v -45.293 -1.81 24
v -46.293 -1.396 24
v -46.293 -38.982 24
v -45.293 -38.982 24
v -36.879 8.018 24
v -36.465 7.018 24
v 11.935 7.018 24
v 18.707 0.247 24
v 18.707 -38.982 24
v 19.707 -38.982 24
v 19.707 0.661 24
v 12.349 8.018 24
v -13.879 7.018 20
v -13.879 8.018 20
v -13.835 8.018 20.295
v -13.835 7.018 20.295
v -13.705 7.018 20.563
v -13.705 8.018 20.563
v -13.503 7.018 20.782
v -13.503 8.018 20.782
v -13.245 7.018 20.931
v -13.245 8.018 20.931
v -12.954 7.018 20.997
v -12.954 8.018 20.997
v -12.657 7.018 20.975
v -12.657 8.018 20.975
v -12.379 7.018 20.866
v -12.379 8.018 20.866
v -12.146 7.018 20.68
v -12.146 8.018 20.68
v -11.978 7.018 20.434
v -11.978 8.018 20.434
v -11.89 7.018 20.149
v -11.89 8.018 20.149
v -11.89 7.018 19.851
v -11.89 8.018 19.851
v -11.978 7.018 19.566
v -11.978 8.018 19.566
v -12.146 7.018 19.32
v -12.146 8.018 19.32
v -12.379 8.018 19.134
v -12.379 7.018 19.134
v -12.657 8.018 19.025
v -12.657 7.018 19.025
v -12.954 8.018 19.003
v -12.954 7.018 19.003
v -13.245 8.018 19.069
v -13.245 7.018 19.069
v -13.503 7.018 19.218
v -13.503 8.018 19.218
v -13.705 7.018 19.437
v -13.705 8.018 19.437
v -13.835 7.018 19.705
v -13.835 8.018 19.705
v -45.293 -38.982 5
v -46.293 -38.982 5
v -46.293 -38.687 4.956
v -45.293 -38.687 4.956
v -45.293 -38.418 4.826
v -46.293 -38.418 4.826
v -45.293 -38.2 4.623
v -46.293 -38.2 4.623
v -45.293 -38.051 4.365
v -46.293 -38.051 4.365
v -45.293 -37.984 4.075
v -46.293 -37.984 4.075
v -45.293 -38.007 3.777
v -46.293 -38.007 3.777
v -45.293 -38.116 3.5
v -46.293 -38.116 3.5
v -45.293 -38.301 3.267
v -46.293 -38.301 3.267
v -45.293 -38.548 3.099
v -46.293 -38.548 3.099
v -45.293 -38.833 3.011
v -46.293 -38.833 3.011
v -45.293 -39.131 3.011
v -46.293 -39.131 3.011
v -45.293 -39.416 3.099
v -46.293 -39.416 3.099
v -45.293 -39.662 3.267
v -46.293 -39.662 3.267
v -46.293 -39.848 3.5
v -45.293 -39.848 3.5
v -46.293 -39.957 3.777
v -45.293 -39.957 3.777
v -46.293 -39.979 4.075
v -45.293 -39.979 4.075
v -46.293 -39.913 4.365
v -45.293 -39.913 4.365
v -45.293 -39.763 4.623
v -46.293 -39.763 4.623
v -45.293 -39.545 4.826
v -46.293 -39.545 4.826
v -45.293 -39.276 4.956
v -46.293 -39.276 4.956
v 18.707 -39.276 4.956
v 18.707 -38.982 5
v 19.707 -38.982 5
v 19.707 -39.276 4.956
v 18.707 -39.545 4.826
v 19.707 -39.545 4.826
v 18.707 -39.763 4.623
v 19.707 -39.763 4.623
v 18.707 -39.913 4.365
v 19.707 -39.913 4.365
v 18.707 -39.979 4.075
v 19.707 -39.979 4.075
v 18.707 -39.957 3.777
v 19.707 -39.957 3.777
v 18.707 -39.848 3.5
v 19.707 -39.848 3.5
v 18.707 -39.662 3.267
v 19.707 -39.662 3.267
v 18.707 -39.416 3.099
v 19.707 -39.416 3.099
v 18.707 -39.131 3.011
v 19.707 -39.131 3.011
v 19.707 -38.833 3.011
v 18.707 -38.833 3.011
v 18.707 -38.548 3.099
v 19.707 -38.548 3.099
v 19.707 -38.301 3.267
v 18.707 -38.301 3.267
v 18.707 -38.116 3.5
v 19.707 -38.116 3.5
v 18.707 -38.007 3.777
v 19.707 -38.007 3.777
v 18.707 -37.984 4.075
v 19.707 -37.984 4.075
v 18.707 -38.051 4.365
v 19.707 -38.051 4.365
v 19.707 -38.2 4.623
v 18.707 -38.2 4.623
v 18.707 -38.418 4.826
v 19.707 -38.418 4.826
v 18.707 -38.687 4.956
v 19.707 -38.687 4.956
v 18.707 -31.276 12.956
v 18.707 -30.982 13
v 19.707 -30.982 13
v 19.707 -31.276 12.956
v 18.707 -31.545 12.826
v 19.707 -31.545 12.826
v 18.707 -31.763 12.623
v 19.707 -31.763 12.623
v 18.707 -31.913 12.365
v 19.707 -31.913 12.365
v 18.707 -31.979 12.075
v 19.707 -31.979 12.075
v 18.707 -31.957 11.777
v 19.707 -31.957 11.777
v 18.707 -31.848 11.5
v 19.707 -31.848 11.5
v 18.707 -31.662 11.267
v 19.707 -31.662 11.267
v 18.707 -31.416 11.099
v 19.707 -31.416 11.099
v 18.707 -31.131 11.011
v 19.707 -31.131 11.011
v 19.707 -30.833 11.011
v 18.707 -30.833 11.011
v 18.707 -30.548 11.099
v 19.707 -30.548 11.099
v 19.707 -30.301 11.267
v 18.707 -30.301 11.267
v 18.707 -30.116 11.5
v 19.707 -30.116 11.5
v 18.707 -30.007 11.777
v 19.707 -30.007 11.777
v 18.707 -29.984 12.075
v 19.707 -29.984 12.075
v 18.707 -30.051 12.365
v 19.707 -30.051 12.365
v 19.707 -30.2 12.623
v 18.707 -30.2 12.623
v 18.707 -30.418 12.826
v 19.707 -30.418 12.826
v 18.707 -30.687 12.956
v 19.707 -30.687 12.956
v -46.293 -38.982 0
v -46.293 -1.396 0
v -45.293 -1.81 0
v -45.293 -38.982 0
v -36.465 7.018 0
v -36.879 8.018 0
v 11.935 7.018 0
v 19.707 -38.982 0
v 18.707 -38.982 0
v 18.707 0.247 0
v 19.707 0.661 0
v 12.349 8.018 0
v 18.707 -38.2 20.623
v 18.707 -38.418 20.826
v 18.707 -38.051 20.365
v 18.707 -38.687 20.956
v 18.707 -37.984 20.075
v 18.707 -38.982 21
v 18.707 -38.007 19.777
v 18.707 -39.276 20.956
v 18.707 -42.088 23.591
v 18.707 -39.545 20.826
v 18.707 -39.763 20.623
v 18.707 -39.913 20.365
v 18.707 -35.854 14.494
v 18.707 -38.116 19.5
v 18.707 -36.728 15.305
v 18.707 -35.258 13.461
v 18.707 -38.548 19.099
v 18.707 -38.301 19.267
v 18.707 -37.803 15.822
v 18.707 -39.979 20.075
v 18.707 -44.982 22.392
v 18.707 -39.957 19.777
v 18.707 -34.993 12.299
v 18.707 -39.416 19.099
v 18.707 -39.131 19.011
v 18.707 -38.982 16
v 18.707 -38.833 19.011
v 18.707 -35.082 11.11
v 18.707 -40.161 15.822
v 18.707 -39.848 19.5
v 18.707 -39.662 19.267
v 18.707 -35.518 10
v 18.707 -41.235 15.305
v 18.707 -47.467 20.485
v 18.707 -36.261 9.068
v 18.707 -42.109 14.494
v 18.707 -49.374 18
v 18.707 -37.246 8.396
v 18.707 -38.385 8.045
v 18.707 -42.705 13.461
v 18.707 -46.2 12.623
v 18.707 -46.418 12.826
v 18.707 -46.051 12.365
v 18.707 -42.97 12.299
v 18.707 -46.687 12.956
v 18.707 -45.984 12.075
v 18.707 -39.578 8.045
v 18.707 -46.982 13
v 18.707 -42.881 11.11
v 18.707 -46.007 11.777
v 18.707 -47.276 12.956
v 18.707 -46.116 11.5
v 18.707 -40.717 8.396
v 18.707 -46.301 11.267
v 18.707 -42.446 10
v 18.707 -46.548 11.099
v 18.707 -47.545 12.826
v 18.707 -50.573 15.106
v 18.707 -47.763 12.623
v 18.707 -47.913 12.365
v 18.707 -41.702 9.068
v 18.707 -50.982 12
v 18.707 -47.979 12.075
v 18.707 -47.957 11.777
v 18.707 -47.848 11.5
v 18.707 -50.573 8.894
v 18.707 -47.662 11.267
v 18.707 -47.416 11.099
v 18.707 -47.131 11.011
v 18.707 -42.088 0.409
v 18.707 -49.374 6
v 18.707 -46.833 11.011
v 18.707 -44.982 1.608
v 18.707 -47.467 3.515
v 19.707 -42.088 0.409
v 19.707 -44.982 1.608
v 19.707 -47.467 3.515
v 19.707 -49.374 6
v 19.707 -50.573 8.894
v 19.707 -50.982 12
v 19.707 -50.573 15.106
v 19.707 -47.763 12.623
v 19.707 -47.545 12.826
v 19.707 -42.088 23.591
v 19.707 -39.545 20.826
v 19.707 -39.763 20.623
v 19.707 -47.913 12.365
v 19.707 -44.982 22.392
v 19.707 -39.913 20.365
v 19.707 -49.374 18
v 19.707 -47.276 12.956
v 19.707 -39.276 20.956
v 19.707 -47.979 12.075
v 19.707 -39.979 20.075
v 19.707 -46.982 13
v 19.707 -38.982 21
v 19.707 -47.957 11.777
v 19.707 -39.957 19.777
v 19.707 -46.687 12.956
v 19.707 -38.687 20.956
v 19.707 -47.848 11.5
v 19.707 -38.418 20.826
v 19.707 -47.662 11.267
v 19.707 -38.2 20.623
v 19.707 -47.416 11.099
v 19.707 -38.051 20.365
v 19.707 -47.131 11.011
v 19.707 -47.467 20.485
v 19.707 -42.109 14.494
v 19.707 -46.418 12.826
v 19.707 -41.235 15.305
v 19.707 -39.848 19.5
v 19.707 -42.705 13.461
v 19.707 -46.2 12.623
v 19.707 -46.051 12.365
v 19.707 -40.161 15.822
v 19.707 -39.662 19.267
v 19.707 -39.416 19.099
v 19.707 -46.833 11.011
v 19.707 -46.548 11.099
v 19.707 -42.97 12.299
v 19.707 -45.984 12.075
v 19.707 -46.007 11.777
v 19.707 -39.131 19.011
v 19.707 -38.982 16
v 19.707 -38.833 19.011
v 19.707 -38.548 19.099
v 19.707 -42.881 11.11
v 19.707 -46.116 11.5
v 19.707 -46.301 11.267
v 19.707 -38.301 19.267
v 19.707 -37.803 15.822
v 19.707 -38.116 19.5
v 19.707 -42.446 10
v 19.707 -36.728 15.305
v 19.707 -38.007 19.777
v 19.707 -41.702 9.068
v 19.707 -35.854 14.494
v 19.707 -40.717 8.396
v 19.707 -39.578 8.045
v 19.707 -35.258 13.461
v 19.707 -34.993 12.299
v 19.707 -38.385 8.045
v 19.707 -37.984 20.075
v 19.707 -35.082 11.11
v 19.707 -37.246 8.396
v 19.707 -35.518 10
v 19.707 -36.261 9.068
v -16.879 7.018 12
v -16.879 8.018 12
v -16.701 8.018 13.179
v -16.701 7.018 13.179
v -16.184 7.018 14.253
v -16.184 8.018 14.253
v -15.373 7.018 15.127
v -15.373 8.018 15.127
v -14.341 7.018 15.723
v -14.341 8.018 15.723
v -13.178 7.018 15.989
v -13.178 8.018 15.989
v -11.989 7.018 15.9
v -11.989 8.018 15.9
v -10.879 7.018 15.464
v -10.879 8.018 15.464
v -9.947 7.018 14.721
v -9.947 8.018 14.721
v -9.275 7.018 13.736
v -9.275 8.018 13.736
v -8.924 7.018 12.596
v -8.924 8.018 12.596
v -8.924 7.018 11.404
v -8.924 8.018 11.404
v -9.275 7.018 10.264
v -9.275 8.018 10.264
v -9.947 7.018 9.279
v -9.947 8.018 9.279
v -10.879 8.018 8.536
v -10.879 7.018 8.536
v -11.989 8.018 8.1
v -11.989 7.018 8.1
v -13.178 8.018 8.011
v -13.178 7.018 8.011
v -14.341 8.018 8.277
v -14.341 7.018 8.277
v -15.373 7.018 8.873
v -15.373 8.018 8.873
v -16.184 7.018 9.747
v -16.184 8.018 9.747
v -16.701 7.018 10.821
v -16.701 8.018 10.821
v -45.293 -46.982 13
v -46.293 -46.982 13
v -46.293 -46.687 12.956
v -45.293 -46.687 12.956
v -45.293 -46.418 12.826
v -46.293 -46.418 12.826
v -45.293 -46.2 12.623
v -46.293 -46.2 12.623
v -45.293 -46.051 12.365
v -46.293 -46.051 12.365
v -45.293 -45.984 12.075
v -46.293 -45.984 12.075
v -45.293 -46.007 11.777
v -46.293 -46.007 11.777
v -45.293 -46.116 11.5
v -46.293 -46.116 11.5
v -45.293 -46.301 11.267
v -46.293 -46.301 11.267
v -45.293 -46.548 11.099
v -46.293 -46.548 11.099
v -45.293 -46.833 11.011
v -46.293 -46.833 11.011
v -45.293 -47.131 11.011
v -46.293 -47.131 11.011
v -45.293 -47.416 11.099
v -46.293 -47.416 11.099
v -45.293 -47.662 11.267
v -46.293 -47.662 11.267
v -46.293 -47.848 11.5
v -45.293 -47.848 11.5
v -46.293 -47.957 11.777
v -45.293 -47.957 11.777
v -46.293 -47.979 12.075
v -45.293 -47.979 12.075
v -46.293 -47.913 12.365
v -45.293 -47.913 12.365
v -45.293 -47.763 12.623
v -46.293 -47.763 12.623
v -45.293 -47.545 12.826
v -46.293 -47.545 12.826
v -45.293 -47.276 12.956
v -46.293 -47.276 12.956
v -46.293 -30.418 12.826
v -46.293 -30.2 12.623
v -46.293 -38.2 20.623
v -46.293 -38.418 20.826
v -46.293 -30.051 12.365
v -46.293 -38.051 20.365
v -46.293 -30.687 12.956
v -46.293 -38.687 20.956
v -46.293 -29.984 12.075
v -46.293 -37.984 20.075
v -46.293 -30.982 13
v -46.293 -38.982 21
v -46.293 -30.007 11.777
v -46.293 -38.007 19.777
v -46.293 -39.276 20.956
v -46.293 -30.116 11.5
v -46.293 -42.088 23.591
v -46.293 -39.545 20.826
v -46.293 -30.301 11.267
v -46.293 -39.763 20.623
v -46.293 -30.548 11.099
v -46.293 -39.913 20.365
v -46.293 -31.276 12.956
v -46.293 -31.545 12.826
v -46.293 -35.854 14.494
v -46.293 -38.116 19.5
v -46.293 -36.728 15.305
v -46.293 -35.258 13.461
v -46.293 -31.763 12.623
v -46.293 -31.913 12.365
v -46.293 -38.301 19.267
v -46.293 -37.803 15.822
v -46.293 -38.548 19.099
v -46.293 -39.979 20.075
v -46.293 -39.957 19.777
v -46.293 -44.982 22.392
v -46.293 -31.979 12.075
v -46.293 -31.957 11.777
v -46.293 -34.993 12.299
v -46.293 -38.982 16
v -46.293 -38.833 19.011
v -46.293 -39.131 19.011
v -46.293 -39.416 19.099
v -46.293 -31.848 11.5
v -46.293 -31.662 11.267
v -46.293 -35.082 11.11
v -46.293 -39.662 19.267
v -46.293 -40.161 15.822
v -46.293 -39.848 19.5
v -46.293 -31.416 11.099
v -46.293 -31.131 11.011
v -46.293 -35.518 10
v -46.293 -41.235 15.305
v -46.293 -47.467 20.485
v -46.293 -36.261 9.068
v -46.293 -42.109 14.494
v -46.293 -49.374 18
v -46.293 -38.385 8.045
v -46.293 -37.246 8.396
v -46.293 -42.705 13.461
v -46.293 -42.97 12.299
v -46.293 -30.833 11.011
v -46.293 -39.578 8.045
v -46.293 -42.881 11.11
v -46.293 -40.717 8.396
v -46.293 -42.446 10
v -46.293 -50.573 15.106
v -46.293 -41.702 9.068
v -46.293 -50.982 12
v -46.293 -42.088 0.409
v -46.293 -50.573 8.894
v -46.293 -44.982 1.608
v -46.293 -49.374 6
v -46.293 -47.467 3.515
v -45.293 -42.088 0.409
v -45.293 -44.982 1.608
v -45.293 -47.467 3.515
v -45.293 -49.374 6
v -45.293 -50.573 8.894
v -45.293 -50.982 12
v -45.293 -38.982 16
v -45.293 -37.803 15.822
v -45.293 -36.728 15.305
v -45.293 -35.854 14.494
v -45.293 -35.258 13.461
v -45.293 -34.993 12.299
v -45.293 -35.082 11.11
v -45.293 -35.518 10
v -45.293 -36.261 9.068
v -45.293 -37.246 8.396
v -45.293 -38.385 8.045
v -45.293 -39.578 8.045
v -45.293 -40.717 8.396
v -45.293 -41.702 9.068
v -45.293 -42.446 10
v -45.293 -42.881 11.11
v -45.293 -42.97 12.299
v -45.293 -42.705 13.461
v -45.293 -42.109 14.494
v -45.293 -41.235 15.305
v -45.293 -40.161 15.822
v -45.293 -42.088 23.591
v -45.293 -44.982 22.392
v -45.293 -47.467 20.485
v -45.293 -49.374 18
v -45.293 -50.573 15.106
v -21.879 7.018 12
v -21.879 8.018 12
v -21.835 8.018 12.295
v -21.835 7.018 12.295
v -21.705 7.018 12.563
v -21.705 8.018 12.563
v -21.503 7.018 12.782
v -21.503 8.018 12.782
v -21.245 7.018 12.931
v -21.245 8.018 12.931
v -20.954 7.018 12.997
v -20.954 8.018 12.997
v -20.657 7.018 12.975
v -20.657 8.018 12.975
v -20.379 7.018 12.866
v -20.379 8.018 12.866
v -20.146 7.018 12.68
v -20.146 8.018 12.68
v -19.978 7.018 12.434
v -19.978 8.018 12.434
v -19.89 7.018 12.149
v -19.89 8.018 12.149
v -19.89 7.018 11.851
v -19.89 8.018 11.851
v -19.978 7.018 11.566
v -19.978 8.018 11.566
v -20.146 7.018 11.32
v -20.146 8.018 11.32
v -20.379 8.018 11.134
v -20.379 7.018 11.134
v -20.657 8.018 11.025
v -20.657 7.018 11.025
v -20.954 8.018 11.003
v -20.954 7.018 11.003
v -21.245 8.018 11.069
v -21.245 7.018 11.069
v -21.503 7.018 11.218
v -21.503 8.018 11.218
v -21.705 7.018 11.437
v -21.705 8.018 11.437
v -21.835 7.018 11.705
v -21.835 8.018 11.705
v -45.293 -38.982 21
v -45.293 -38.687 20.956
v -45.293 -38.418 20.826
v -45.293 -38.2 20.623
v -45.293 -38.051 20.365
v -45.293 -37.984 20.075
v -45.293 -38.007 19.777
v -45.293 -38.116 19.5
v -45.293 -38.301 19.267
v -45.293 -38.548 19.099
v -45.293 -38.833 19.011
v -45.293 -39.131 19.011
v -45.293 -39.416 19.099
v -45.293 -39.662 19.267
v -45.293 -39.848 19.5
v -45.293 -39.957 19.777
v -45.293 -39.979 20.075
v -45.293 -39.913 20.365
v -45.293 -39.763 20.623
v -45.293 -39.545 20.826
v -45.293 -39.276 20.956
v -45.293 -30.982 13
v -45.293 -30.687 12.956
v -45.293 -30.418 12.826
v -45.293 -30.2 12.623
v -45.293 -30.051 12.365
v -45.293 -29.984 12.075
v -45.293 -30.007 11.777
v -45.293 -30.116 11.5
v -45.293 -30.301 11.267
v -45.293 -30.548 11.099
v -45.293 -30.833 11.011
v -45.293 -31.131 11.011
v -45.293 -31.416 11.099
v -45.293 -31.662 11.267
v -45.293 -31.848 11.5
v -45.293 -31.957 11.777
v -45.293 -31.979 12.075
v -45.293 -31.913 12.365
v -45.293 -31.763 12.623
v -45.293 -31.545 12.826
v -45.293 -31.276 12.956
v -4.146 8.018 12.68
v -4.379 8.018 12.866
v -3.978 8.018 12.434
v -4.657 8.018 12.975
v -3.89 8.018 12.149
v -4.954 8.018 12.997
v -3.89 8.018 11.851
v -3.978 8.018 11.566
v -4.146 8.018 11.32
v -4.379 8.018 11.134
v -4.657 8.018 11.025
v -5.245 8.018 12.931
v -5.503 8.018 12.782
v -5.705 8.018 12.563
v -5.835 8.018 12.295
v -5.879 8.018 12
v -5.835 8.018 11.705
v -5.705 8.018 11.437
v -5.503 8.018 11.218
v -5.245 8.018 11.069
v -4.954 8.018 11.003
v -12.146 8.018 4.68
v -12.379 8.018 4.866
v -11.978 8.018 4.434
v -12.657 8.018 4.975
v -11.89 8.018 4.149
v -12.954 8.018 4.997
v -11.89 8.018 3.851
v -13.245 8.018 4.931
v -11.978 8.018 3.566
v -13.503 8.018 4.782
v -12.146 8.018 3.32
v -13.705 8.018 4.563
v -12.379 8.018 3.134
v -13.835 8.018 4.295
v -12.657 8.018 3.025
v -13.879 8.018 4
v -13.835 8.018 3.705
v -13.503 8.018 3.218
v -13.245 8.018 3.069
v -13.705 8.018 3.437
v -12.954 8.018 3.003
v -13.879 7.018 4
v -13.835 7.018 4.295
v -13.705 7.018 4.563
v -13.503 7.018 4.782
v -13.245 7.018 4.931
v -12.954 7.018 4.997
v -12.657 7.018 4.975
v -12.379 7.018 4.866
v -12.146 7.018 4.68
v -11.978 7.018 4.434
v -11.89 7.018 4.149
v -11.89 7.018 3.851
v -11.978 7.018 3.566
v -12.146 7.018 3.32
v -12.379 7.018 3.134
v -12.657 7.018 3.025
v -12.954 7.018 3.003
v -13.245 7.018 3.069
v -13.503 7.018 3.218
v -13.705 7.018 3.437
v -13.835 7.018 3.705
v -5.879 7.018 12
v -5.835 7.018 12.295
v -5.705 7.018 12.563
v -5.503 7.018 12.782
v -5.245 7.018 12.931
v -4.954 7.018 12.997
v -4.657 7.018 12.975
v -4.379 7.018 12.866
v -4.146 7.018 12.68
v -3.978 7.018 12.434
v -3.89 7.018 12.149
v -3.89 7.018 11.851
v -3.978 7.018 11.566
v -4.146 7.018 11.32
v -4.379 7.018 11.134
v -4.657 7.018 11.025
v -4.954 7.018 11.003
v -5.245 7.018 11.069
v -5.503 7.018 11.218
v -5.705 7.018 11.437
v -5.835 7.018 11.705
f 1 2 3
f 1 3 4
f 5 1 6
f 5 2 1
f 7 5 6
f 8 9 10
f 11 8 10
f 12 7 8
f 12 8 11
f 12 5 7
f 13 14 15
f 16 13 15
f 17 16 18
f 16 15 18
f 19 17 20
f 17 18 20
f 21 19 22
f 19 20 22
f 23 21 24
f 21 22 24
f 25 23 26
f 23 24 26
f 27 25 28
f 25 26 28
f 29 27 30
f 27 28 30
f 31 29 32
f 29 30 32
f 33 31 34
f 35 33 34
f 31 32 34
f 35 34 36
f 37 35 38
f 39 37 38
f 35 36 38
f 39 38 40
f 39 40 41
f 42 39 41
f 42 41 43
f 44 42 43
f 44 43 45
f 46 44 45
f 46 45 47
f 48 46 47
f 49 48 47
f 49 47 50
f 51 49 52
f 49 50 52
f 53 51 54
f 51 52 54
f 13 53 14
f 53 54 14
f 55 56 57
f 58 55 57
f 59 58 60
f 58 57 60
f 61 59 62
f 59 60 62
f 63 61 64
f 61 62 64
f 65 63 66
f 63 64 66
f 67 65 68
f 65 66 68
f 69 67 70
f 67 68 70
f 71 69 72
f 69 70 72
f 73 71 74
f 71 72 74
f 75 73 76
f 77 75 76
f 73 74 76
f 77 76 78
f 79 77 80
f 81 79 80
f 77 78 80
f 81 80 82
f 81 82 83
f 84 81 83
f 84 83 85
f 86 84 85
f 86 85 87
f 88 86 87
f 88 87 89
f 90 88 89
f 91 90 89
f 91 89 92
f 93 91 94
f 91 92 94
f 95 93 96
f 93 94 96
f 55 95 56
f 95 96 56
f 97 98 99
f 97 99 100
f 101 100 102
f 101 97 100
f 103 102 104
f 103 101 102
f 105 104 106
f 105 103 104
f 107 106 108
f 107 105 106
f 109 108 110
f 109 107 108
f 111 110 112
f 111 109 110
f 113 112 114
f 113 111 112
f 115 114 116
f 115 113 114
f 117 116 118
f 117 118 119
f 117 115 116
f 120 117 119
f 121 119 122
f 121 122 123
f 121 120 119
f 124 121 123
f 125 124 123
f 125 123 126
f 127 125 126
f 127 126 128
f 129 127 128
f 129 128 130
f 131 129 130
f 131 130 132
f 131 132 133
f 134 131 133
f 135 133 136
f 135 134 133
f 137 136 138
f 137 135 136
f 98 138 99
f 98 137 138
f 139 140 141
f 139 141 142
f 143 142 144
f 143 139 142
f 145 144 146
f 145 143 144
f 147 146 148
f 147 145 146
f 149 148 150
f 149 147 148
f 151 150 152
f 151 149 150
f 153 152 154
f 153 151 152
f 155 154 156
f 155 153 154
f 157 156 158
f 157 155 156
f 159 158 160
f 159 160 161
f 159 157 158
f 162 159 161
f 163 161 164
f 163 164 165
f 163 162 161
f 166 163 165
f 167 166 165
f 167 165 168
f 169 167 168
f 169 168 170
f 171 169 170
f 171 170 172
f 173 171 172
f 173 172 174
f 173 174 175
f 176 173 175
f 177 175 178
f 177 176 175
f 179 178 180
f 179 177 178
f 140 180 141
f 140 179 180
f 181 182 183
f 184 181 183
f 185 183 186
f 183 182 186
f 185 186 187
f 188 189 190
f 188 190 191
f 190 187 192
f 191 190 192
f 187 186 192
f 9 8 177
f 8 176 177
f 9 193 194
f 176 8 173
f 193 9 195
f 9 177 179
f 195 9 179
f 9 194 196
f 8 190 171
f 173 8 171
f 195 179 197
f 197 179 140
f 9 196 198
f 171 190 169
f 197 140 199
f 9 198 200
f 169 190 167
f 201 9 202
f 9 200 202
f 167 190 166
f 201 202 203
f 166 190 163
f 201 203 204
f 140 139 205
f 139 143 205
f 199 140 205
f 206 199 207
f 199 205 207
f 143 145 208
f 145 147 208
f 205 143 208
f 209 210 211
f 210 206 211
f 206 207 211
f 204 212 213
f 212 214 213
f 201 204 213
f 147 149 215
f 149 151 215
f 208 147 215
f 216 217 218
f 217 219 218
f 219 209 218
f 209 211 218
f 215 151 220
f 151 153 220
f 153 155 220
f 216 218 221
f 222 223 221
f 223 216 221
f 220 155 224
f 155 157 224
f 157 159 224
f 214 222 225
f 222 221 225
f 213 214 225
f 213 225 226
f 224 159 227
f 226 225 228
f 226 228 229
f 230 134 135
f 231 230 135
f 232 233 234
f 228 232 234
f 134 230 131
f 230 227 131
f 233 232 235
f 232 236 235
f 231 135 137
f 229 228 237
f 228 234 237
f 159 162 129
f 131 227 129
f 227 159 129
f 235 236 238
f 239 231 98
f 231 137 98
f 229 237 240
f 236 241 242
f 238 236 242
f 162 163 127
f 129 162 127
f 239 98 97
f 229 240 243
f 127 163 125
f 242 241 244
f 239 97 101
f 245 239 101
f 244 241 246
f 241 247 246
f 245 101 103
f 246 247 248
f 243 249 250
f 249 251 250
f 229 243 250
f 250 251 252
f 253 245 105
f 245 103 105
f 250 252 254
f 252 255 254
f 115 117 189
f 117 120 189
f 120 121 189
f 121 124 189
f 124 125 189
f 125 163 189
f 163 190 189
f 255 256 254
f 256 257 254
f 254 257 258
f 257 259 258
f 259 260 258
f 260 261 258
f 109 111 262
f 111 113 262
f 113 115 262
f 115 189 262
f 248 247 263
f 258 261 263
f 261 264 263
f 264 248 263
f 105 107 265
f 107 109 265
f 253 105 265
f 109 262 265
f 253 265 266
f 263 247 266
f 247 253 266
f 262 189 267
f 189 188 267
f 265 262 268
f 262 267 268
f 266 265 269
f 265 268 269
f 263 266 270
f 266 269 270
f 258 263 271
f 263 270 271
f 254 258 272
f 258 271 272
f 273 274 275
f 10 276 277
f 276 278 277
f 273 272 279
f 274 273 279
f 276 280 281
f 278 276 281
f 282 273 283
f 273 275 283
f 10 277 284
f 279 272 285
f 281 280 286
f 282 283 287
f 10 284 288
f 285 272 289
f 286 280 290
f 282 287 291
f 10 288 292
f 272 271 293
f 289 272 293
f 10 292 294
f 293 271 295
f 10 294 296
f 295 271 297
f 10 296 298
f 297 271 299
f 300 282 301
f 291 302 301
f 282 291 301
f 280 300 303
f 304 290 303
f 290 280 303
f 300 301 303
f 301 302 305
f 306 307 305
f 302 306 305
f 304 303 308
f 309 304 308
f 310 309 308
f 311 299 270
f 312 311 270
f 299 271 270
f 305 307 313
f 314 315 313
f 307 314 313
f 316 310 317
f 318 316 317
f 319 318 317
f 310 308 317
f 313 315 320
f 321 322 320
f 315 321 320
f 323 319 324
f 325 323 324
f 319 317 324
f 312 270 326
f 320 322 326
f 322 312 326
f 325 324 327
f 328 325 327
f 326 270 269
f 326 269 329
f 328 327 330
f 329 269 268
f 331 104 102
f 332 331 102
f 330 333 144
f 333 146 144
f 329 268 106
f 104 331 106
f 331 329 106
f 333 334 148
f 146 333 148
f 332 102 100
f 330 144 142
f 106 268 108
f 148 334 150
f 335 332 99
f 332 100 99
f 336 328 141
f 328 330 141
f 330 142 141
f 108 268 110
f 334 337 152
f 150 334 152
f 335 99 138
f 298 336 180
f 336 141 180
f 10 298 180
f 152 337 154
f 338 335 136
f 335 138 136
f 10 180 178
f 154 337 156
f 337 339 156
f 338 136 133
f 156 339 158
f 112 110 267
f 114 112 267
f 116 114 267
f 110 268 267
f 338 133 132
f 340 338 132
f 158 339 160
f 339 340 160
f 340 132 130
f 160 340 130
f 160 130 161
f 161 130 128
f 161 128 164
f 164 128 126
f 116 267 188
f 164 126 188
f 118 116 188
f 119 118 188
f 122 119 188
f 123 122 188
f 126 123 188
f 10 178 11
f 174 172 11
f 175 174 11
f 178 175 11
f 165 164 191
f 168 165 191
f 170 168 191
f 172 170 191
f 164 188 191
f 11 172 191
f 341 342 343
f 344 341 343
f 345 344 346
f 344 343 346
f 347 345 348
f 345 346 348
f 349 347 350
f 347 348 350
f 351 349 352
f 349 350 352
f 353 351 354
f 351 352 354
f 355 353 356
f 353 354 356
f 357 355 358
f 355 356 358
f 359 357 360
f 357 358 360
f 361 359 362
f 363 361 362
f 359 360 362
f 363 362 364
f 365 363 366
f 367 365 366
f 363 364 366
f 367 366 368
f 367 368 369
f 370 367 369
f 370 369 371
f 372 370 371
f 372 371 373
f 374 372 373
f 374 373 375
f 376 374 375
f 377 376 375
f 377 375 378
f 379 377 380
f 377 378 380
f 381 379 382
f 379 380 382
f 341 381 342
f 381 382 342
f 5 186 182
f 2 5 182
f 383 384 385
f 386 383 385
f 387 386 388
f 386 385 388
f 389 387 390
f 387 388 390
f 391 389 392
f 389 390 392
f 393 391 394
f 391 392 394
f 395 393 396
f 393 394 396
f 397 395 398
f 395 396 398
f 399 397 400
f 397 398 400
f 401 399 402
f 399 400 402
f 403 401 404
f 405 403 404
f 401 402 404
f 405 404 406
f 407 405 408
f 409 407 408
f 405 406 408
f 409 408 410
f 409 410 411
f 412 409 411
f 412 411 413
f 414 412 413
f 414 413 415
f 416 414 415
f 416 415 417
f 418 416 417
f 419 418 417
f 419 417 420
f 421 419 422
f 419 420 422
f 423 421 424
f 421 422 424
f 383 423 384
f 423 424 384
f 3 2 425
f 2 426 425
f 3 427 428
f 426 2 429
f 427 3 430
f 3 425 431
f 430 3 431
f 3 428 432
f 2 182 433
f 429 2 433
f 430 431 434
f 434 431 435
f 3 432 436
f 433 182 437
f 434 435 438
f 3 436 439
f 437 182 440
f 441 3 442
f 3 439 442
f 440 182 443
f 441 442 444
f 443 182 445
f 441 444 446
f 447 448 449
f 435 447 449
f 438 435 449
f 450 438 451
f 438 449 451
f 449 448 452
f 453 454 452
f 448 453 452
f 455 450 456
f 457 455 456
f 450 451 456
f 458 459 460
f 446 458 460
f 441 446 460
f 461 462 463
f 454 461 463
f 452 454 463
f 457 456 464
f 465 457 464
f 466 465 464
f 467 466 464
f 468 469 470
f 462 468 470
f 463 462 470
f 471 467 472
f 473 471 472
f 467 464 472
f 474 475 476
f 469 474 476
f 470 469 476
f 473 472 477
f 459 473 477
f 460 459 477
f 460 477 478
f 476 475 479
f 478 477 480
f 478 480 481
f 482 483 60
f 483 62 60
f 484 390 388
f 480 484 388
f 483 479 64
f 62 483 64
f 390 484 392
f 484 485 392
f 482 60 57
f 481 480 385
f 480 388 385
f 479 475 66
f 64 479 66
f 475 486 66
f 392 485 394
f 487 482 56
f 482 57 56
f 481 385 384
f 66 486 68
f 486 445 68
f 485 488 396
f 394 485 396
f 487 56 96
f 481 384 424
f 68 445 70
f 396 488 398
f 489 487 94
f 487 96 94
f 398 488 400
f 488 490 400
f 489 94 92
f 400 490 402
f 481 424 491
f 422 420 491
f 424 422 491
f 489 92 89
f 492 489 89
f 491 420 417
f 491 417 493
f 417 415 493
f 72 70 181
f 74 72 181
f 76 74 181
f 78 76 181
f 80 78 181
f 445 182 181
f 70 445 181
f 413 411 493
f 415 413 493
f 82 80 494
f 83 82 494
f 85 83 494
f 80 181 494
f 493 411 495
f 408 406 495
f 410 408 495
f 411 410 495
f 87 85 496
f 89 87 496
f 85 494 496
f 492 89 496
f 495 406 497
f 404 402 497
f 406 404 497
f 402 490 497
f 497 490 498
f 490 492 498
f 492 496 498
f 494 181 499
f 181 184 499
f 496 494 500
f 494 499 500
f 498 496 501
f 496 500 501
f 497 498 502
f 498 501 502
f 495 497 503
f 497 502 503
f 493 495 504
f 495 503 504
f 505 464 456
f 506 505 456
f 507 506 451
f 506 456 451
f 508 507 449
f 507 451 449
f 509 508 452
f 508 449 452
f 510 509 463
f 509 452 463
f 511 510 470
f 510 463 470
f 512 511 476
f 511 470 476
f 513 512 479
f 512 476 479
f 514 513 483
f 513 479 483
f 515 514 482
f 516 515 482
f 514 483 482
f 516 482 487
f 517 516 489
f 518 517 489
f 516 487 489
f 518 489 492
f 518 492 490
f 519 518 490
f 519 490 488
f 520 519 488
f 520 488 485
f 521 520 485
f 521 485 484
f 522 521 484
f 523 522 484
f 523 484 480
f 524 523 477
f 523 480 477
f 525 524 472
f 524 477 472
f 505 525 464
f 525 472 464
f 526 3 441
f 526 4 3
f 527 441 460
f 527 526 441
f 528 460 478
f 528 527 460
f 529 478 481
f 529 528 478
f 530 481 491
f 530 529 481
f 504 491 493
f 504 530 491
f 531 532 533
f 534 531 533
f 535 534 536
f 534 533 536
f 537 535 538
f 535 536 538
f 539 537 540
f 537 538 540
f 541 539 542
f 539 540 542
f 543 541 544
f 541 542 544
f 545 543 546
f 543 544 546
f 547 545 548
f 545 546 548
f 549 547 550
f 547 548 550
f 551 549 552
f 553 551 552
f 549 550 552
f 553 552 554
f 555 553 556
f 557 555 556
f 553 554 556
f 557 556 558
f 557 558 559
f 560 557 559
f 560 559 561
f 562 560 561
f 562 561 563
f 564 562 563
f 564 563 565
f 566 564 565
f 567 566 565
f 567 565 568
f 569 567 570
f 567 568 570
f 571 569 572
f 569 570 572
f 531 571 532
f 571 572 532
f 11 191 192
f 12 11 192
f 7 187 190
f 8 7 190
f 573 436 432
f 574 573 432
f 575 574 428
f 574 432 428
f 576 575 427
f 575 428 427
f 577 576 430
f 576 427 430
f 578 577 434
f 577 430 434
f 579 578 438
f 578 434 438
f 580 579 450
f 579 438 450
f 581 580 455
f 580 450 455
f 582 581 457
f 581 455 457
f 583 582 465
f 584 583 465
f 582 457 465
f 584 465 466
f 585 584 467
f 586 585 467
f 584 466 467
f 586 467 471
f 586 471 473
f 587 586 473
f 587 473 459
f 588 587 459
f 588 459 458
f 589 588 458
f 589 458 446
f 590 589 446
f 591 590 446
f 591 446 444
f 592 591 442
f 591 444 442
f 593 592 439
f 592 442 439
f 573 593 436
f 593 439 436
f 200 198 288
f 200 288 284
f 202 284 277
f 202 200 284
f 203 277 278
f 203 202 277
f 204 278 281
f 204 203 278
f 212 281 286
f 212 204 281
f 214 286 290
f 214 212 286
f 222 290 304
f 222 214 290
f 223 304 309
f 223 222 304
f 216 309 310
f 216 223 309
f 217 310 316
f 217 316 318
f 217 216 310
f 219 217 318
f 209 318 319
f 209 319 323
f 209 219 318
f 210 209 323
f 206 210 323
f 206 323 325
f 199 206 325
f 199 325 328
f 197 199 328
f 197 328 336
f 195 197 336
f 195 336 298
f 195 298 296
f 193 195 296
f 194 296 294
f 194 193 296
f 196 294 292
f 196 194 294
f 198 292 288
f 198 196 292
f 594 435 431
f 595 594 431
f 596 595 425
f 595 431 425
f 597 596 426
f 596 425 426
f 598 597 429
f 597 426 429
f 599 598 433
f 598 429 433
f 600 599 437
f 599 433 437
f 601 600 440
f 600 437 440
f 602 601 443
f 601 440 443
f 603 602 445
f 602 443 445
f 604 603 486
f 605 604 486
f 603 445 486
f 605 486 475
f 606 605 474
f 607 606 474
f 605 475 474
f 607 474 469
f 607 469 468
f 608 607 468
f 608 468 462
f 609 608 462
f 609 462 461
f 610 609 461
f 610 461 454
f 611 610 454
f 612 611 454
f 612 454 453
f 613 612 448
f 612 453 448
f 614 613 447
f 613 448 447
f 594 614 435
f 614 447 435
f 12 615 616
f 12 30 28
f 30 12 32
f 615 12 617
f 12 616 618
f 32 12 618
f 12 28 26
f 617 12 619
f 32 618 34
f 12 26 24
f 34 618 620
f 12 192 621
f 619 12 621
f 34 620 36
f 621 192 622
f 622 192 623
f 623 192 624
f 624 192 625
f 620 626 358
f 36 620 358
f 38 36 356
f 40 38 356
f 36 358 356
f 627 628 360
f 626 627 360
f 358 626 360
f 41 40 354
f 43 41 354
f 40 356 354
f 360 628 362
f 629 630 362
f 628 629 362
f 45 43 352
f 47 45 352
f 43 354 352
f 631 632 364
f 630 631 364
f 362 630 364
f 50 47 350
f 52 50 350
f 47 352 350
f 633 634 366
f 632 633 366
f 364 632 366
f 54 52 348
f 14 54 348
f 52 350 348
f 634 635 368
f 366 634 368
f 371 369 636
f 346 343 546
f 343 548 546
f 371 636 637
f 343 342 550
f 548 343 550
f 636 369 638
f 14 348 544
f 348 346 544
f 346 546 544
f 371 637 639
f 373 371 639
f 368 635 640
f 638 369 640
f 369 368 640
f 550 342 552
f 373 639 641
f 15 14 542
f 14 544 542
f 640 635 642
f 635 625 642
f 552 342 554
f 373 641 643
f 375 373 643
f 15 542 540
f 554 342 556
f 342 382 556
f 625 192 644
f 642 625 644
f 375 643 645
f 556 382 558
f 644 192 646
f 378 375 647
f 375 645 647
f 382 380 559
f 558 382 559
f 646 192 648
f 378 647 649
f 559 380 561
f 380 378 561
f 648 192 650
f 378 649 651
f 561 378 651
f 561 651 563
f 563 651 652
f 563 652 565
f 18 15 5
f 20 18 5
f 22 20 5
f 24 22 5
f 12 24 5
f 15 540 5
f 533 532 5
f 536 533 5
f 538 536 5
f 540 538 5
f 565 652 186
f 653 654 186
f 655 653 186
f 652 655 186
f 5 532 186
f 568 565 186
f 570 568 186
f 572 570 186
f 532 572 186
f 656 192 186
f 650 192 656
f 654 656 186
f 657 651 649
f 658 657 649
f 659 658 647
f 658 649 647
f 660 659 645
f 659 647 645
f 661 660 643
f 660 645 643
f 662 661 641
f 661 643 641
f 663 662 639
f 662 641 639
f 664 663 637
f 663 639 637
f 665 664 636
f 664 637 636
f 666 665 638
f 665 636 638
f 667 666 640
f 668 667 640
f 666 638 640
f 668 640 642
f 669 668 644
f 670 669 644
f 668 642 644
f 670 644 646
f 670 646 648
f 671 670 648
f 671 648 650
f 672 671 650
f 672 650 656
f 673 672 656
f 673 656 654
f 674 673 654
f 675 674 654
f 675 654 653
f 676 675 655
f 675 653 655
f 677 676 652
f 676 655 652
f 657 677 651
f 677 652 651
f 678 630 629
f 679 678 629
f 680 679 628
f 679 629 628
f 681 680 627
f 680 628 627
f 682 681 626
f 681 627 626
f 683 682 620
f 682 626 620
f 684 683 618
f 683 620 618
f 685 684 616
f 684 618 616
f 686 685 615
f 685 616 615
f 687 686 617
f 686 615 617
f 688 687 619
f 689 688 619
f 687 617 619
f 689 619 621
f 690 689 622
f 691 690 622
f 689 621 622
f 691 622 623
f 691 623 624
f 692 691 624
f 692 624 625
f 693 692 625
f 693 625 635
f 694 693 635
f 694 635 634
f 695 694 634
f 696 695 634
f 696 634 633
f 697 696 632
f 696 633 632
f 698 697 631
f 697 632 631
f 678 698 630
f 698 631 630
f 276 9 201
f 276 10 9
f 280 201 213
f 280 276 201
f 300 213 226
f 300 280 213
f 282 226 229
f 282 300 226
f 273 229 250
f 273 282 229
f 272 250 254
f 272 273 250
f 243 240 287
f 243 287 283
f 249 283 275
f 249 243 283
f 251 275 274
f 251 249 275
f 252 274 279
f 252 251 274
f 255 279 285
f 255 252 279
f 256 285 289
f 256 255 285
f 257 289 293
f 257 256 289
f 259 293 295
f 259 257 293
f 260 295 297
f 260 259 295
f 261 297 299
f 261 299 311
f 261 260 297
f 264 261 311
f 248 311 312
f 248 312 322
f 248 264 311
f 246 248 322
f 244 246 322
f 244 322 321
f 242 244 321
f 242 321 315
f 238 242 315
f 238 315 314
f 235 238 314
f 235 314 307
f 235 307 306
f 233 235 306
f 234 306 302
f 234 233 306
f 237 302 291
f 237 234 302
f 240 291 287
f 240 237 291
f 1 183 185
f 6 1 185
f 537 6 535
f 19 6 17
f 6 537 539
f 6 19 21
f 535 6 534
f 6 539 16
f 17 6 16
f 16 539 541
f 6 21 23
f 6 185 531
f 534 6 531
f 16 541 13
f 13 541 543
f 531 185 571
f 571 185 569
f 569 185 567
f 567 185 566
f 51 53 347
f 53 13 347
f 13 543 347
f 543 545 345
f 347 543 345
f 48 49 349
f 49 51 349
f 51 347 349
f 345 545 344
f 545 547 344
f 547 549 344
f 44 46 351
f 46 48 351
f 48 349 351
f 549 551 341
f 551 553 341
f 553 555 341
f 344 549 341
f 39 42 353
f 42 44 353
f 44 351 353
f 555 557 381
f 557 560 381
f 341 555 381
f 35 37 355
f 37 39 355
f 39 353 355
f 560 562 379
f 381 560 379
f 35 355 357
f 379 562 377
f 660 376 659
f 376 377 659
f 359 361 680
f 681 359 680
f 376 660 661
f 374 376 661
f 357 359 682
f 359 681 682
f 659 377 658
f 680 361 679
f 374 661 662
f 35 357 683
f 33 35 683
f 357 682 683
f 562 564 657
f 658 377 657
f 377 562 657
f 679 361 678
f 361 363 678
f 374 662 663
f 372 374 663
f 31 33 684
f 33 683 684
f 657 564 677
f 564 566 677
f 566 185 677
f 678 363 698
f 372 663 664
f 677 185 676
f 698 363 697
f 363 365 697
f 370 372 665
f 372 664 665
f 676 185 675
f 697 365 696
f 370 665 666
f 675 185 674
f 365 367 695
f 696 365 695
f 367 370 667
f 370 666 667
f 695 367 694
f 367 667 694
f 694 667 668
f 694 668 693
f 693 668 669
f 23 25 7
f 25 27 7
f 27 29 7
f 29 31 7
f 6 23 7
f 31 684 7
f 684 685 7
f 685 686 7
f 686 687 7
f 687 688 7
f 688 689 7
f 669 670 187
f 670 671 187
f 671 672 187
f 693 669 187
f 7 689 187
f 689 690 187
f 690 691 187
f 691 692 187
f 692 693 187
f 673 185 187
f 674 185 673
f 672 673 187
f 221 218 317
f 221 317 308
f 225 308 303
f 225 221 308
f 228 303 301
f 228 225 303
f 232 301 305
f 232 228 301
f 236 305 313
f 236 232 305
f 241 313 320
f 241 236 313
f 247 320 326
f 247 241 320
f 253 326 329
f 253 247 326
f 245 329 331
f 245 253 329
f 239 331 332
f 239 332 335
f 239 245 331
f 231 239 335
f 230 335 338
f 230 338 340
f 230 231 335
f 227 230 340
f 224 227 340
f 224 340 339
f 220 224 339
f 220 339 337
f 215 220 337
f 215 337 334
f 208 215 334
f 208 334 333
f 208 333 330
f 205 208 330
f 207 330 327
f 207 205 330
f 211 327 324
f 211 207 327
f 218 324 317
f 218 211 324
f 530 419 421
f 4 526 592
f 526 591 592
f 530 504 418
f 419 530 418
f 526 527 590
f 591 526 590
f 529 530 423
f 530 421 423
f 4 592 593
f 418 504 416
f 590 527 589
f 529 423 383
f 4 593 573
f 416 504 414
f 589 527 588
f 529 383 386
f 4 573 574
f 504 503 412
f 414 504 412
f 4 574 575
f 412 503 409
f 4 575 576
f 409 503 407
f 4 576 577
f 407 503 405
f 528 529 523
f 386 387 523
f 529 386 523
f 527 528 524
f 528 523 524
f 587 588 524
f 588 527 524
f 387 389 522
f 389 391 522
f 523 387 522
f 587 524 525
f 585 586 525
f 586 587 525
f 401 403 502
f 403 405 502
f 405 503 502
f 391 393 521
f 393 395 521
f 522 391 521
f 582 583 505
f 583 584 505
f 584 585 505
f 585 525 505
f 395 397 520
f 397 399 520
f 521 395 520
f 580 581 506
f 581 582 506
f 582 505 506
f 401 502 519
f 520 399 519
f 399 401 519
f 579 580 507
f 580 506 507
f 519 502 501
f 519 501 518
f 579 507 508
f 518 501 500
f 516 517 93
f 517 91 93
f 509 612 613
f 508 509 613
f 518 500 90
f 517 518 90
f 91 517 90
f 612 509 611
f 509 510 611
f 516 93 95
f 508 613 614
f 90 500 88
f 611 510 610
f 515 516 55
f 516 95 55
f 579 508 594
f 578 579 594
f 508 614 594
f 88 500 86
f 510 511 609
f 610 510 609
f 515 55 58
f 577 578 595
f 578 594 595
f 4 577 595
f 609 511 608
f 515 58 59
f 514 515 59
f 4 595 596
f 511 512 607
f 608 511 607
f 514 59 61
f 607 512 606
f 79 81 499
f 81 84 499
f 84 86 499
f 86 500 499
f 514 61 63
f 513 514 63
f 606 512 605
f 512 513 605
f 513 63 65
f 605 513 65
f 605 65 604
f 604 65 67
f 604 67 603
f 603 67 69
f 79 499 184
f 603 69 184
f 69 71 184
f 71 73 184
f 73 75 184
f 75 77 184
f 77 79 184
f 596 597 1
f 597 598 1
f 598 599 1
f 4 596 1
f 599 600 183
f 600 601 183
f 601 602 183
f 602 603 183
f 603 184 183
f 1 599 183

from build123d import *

# Parameters (mm, degrees)
BOSS_EXTRUDE1_DEPTH = 24
SKETCH5_R           = 1
SKETCH5_R_2         = 4
CUT_EXTRUDE3_DEPTH  = 1
CUT_EXTRUDE4_START  = -1
SKETCH6_R           = 4
SKETCH6_R_2         = 1
CUT_EXTRUDE4_DEPTH  = 1
SKETCH7_R           = 4
SKETCH7_R_2         = 1
CUT_EXTRUDE5_DEPTH  = 1
FILLET1_R           = 12


with BuildPart() as part:
    # Sketch1 → Boss-Extrude1 (new body)
    with BuildSketch(Plane.XY):
        Polygon((18.706612688, 0.24678935), (18.706612688, -50.981637775), (19.706612688, -50.981637775), (19.706612688, 0.661002912), (12.349253376, 8.018362225), (-36.879173749, 8.018362225), (-46.293387312, -1.395851338), (-46.293387312, -50.981637775), (-45.293387312, -50.981637775), (-45.293387312, -1.8100649), (-36.464960187, 7.018362225), (11.935039813, 7.018362225), align=None)
    extrude(amount=BOSS_EXTRUDE1_DEPTH)

    # Sketch5 → Cut-Extrude3 (cut)
    with BuildSketch(Plane.ZY.offset(46.293387312)):
        with Locations((20, -38.981637775)):
            Circle(SKETCH5_R)
        with Locations((12, -38.981637775)):
            Circle(SKETCH5_R_2)
        with Locations((12, -46.981637775)):
            Circle(SKETCH5_R)
        with Locations((4, -38.981637775)):
            Circle(SKETCH5_R)
        with Locations((12, -30.981637775)):
            Circle(SKETCH5_R)
    extrude(amount=-CUT_EXTRUDE3_DEPTH, mode=Mode.SUBTRACT)

    # Sketch6 → Cut-Extrude4 (cut)
    with BuildSketch(Plane(origin=(19.706612688, 0, 0), x_dir=(0, 0, -1), z_dir=(1, 0, 0)).offset(CUT_EXTRUDE4_START)):
        with Locations(Location((-12, -38.981637775, 0), (0, 0, 180))):
            Circle(SKETCH6_R)
        with Locations(Location((-4, -38.981637775, 0), (0, 0, 180))):
            Circle(SKETCH6_R_2)
        with Locations(Location((-12, -46.981637775, 0), (0, 0, 180))):
            Circle(SKETCH6_R_2)
        with Locations(Location((-20, -38.981637775, 0), (0, 0, 180))):
            Circle(SKETCH6_R_2)
        with Locations(Location((-12, -30.981637775, 0), (0, 0, 180))):
            Circle(SKETCH6_R_2)
    extrude(amount=CUT_EXTRUDE4_DEPTH, mode=Mode.SUBTRACT)

    # Sketch7 → Cut-Extrude5 (cut)
    with BuildSketch(Plane(origin=(0, 8.018362225, 0), x_dir=(1, 0, 0), z_dir=(0, 1, 0))):
        with Locations(Location((-12.879173749, -12, 0), (0, 0, 180))):
            Circle(SKETCH7_R)
        with Locations(Location((-12.879173749, -20, 0), (0, 0, 180))):
            Circle(SKETCH7_R_2)
        with Locations(Location((-20.879173749, -12, 0), (0, 0, 180))):
            Circle(SKETCH7_R_2)
        with Locations(Location((-12.879173749, -4, 0), (0, 0, 180))):
            Circle(SKETCH7_R_2)
        with Locations(Location((-4.879173749, -12, 0), (0, 0, 180))):
            Circle(SKETCH7_R_2)
    extrude(amount=-CUT_EXTRUDE5_DEPTH, mode=Mode.SUBTRACT)

    # Fillet1
    fillet1_edges = [part.edges().sort_by_distance(p)[0] for p in [
        (19.206612688, -50.981637775, 24),
        (19.206612688, -50.981637775, 0),
        (-45.793387312, -50.981637775, 24),
        (-45.793387312, -50.981637775, 0),
    ]]
    fillet(fillet1_edges, radius=FILLET1_R - 0.0001)  # a hair under: the kernel refuses the full size


solid = part.part
